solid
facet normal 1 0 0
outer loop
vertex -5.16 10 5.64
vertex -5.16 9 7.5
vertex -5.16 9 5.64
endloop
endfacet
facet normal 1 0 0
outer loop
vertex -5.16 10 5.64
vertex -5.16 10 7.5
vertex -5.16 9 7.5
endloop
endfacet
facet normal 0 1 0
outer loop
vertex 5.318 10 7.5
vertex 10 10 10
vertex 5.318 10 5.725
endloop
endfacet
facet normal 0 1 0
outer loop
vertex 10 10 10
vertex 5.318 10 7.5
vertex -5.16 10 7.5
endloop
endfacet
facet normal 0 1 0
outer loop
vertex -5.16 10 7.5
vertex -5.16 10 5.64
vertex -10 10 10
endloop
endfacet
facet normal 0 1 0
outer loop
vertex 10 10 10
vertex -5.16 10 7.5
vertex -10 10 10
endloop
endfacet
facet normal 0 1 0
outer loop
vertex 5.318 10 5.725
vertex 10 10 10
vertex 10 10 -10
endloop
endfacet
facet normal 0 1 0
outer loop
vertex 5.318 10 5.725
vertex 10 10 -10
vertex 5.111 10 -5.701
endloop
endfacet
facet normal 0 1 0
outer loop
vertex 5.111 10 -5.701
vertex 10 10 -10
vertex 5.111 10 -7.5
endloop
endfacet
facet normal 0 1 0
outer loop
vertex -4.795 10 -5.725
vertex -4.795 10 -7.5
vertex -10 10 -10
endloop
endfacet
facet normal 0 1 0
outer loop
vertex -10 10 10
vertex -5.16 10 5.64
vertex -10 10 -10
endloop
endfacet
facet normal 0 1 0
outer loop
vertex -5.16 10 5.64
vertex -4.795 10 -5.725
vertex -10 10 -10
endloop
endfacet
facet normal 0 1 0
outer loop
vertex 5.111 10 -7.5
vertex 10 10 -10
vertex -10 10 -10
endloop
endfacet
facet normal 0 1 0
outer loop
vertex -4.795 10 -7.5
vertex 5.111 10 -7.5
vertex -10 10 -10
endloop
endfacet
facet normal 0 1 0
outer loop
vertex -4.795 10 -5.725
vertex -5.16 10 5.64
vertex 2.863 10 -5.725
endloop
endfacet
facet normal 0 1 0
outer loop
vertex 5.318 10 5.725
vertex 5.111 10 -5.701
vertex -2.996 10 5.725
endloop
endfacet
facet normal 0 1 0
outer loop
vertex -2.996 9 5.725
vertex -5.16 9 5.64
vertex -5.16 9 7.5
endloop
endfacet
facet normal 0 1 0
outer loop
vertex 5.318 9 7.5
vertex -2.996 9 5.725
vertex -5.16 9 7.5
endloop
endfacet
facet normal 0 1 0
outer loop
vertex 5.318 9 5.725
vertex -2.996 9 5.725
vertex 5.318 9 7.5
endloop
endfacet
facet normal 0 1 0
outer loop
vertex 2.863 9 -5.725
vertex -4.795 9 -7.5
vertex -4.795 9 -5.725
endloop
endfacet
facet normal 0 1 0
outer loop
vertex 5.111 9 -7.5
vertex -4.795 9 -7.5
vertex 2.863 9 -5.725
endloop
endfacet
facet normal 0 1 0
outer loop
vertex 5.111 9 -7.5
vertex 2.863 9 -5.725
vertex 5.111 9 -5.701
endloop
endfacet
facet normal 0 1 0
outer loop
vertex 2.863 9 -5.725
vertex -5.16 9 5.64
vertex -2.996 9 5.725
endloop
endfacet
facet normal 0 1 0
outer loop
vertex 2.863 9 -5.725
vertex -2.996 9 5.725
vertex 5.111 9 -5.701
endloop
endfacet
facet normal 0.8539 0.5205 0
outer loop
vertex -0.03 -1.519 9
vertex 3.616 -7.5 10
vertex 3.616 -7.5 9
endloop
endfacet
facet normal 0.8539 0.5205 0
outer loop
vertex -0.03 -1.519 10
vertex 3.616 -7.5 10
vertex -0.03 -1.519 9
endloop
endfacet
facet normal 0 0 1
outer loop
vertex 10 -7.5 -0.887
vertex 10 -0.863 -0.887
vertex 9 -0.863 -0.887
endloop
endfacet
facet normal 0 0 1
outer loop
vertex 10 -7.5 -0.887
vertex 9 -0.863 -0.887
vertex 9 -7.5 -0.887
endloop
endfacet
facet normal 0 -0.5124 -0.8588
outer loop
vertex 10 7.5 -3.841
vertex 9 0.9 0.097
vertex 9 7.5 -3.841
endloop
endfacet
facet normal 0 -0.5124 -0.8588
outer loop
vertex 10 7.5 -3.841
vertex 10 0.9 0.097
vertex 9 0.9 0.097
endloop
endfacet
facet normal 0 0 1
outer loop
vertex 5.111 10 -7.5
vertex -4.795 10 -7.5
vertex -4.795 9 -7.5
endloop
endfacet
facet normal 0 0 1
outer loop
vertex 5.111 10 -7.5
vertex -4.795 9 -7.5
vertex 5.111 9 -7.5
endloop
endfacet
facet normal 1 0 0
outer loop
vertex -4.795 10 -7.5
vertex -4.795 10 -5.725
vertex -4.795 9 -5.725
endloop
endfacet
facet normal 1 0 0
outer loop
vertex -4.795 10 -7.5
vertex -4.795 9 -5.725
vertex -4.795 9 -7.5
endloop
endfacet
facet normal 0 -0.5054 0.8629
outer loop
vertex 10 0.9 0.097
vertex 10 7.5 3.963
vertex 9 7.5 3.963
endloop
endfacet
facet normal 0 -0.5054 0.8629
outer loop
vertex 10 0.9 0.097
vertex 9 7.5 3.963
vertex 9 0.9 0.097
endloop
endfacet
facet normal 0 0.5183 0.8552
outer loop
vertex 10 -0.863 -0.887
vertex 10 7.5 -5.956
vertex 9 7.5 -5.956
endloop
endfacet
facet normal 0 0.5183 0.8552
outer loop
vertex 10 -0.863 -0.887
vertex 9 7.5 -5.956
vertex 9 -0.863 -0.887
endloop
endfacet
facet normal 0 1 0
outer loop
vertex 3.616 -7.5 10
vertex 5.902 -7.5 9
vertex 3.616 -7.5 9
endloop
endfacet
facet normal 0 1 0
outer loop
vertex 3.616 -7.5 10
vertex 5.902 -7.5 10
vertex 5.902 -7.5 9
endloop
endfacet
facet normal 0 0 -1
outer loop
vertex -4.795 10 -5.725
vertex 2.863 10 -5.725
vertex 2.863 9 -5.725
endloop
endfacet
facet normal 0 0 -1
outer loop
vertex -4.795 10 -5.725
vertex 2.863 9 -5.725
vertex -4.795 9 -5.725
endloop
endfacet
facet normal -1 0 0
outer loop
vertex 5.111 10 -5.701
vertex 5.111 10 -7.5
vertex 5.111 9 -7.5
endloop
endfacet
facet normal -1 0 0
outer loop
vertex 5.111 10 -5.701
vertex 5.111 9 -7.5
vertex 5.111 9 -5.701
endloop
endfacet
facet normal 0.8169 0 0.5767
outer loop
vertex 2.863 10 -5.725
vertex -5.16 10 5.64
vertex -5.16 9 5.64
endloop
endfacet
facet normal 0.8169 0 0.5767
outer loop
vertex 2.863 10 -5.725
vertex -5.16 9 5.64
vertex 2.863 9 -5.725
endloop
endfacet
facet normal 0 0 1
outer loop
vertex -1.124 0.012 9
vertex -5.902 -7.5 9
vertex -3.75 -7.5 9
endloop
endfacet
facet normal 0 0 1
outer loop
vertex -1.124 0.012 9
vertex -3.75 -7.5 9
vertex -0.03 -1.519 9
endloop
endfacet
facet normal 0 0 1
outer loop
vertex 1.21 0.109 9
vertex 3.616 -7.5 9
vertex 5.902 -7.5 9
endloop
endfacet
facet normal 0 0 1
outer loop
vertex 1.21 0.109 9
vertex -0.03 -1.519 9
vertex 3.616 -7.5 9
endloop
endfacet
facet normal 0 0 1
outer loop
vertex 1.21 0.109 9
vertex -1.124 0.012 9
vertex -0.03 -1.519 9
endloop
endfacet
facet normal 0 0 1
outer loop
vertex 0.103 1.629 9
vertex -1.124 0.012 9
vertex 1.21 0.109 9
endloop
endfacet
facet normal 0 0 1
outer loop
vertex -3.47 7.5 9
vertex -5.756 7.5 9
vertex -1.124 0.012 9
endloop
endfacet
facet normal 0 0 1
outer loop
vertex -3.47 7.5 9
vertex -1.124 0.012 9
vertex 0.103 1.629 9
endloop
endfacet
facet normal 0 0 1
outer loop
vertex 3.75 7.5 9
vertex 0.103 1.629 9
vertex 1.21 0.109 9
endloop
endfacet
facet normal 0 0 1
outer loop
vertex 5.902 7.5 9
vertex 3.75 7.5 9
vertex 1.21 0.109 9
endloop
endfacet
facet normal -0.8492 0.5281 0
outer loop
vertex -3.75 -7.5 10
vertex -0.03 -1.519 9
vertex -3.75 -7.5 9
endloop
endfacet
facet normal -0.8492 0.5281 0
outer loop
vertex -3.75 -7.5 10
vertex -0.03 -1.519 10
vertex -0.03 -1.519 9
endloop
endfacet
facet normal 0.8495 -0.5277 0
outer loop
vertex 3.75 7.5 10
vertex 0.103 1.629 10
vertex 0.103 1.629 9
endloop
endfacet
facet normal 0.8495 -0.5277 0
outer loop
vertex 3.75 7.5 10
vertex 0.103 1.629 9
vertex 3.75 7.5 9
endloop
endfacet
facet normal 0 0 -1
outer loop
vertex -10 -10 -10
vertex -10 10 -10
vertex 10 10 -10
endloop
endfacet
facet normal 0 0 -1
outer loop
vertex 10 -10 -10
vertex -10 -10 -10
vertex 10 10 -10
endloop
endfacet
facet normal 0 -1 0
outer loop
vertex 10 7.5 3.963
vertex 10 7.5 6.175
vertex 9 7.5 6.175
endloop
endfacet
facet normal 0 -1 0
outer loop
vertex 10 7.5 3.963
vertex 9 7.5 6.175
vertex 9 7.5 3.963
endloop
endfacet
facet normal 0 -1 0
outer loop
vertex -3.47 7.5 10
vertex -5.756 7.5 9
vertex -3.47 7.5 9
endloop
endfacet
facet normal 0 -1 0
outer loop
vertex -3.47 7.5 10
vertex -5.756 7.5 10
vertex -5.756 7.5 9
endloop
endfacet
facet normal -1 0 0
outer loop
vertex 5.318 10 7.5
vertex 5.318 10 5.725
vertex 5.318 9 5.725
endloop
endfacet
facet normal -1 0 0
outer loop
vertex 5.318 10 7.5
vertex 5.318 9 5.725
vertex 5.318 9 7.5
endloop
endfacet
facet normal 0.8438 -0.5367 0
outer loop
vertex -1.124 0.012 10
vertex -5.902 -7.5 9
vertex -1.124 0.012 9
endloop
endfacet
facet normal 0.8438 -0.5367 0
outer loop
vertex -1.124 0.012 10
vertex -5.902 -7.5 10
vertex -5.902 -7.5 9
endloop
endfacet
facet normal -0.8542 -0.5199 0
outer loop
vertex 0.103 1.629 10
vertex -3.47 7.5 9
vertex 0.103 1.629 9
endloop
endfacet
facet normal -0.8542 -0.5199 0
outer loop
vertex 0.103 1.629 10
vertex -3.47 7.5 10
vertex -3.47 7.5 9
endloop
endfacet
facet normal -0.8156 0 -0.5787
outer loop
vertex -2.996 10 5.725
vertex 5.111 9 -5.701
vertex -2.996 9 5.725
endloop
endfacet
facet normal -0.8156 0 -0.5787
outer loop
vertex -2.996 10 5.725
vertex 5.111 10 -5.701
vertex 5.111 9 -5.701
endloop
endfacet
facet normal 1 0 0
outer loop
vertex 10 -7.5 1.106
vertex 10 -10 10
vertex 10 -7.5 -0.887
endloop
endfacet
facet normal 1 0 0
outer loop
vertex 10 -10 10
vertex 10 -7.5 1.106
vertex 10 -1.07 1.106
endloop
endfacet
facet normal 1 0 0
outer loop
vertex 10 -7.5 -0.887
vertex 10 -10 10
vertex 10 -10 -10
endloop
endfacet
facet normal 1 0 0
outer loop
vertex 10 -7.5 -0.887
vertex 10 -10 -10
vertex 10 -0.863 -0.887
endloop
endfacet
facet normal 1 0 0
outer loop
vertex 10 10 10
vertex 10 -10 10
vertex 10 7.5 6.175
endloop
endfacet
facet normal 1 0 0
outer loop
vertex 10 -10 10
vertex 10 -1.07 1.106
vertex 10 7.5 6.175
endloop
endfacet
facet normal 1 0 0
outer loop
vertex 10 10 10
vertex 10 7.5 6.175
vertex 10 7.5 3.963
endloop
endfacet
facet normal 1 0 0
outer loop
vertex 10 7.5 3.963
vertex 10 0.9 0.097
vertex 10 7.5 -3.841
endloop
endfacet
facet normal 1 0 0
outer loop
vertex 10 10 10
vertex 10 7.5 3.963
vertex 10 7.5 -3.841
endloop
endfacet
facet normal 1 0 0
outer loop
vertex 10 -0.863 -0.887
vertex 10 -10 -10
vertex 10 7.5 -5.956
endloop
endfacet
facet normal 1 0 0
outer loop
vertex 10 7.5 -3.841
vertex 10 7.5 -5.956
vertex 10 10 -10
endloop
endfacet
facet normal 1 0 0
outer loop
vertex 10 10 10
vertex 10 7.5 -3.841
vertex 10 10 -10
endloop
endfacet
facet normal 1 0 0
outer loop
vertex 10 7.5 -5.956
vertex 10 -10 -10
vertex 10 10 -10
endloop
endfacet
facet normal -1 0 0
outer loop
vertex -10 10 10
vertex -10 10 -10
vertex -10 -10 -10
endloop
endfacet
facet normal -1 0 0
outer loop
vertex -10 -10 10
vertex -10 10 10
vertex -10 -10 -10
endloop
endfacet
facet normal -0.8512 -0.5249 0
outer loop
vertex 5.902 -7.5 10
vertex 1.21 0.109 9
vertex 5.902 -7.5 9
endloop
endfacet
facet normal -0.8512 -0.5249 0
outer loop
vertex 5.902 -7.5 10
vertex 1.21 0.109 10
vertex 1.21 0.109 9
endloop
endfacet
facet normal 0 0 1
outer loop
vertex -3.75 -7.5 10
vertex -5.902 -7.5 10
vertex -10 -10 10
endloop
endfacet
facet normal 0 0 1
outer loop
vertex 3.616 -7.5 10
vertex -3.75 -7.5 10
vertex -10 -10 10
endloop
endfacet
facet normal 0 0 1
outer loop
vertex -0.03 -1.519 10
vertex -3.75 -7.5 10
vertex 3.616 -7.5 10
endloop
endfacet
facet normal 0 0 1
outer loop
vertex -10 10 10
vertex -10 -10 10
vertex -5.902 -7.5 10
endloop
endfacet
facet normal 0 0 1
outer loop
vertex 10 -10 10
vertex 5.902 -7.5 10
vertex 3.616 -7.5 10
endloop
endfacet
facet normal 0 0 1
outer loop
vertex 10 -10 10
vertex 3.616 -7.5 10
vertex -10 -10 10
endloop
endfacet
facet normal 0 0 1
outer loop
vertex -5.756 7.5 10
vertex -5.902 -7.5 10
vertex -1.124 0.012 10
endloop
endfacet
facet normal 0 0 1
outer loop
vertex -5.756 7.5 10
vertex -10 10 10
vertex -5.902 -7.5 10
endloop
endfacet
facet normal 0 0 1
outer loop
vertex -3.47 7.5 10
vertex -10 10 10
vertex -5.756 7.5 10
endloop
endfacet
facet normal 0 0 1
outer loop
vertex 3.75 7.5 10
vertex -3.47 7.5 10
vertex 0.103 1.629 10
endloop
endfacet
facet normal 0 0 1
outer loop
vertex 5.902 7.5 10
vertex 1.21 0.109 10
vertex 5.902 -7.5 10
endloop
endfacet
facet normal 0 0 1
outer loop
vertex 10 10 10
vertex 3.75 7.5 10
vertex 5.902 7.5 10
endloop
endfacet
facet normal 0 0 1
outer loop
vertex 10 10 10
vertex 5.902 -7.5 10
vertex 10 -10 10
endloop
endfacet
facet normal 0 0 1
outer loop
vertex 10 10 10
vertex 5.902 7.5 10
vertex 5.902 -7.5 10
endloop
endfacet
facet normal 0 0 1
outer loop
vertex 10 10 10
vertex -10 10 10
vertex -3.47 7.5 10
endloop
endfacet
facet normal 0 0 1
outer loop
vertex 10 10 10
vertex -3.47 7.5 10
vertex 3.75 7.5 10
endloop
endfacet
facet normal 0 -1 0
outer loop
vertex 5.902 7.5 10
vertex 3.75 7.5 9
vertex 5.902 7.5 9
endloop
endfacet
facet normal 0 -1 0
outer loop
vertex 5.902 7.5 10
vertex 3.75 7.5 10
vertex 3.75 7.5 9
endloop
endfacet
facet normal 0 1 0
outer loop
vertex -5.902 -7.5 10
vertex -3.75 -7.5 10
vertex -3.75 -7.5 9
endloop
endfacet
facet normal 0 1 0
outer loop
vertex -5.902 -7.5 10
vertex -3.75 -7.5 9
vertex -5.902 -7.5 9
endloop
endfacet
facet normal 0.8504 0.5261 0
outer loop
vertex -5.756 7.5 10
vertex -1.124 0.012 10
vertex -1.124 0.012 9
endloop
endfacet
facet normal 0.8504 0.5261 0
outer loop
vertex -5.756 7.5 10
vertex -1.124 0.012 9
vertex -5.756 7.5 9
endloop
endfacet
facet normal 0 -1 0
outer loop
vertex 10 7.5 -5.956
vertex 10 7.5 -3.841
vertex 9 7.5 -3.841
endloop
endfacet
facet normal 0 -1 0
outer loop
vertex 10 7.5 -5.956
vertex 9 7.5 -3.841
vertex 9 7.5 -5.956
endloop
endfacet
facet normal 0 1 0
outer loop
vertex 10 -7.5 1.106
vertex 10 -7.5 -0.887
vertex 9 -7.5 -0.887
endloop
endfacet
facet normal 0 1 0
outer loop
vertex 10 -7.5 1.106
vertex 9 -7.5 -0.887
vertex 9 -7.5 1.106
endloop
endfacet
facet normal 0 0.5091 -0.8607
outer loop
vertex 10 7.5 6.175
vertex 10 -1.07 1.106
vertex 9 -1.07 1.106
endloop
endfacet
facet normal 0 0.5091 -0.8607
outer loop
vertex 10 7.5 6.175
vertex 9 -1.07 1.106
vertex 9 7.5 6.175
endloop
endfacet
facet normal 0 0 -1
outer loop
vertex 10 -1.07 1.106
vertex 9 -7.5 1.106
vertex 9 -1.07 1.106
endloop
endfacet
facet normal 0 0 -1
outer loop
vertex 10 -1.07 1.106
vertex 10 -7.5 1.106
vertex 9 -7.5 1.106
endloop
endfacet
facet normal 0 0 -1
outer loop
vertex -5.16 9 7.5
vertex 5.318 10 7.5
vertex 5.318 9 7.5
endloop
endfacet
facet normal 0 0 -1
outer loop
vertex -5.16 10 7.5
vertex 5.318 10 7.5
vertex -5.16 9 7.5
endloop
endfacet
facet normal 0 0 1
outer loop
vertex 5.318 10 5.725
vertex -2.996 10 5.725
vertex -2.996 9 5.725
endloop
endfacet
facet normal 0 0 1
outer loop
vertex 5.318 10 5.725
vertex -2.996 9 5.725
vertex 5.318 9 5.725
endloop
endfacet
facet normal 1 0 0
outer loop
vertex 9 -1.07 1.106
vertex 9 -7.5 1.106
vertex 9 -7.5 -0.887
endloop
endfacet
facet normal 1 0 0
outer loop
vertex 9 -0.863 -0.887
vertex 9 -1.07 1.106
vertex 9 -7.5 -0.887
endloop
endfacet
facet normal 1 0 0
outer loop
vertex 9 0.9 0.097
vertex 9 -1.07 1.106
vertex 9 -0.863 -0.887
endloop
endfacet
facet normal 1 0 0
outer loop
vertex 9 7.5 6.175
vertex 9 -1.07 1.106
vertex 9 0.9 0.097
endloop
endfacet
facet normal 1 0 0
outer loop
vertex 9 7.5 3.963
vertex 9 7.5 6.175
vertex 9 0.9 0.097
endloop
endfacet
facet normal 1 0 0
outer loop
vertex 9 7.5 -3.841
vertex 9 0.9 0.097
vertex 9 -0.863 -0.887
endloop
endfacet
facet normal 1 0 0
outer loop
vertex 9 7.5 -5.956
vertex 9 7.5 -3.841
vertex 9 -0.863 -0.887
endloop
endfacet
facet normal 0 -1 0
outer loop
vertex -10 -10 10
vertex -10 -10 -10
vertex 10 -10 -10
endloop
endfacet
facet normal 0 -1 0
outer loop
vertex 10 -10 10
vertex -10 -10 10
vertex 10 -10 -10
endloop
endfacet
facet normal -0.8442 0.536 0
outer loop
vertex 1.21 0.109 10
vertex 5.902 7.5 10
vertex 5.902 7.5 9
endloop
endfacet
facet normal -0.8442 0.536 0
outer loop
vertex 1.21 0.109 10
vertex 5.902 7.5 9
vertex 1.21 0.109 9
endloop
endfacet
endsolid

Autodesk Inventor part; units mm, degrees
ref_plane "YZ Plane" through (0, 0, 0) normal (1, 0, 0) x (0, 1, 0)
ref_plane "XZ Plane" through (0, 0, 0) normal (0, 1, 0) x (-1, 0, 0)
ref_plane "XY Plane" through (0, 0, 0) normal (0, 0, 1) x (1, 0, 0)
sketch "Esboço1" plane through (0, 0, 0) normal (0, 0, 1) x (1, 0, 0)
  line L0 (-10, -10) -> (10, -10)
  line L1 (10, -10) -> (10, 10)
  line L2 (10, 10) -> (-10, 10)
  line L3 (-10, 10) -> (-10, -10)
  line L4 (-10, -10) -> (10, 10) construction
  line L5 (10, -10) -> (-10, 10) construction
  point P0 (0, 0)
  dimension "d0" = 20
  dimension "d1" = 20
extrude "Extrusão1" add sketch "Esboço1" along normal mid plane 20
sketch "Esboço2" plane through (0, 0, 10) normal (0, 0, 1) x (1, 0, 0)
  line L0 (-10, 10) -> (10, 10) construction
  line L1 (10, 10) -> (10, -10) construction
  line L2 (10, -10) -> (-10, -10) construction
  line L3 (-10, -10) -> (-10, 10) construction
  line L4 (5.9015, -7.5) -> (3.6163, -7.5)
  line L5 (3.6163, -7.5) -> (-0.0304, -1.5194)
  line L6 (-0.0304, -1.5194) -> (-3.75, -7.5)
  line L7 (-3.75, -7.5) -> (-5.9015, -7.5)
  line L8 (-5.9015, -7.5) -> (-1.1244, 0.0122)
  line L9 (-1.1244, 0.0122) -> (-5.7557, 7.5)
  line L10 (-5.7557, 7.5) -> (-3.4704, 7.5)
  line L11 (-3.4704, 7.5) -> (0.1033, 1.6288)
  line L12 (0.1033, 1.6288) -> (3.75, 7.5)
  line L13 (3.75, 7.5) -> (5.9015, 7.5)
  line L14 (5.9015, 7.5) -> (1.2095, 0.1094)
  line L15 (1.2095, 0.1094) -> (5.9015, -7.5)
  point P0 (0, 0)
extrude "Extrusão2" cut sketch "Esboço2" against normal blind 1
sketch "Esboço3" plane through (10, -10, 10) normal (1, 0, 0) x (0, 0, -1)
  line L0 (0, 20) -> (20, 20) construction
  line L1 (20, 20) -> (20, 0) construction
  line L2 (20, 0) -> (0, 0) construction
  line L3 (0, 0) -> (0, 20) construction
  line L4 (15.9562, 17.5) -> (10.8874, 9.137)
  line L5 (10.8874, 9.137) -> (10.8874, 2.5)
  line L6 (10.8874, 2.5) -> (8.8938, 2.5)
  line L7 (8.8938, 2.5) -> (8.8938, 8.9303)
  line L8 (8.8938, 8.9303) -> (3.825, 17.5)
  line L9 (3.825, 17.5) -> (6.0373, 17.5)
  line L10 (6.0373, 17.5) -> (9.9028, 10.8995)
  line L11 (9.9028, 10.8995) -> (13.8412, 17.5)
  line L12 (13.8412, 17.5) -> (15.9562, 17.5)
  point P0 (10, 10)
extrude "Extrusão3" cut sketch "Esboço3" against normal blind 1
sketch "Esboço4" plane through (-10, 10, 10) normal (0, 1, 0) x (1, 0, 0)
  line L0 (0, 20) -> (20, 20) construction
  line L1 (20, 20) -> (20, 0) construction
  line L2 (20, 0) -> (0, 0) construction
  line L3 (0, 0) -> (0, 20) construction
  line L4 (15.3181, 2.5) -> (4.84, 2.5)
  line L5 (4.84, 2.5) -> (4.84, 4.3598)
  line L6 (4.84, 4.3598) -> (12.8626, 15.7253)
  line L7 (12.8626, 15.7253) -> (5.2046, 15.7253)
  line L8 (5.2046, 15.7253) -> (5.2046, 17.5)
  line L9 (5.2046, 17.5) -> (15.1114, 17.5)
  line L10 (15.1114, 17.5) -> (15.1114, 15.701)
  line L11 (15.1114, 15.701) -> (7.0036, 4.2747)
  line L12 (7.0036, 4.2747) -> (15.3181, 4.2747)
  line L13 (15.3181, 4.2747) -> (15.3181, 2.5)
  point P0 (10, 10)
extrude "Extrusão4" cut sketch "Esboço4" against normal blind 1
properties part number "Cubo-0001-002" material "ABS plástico"
